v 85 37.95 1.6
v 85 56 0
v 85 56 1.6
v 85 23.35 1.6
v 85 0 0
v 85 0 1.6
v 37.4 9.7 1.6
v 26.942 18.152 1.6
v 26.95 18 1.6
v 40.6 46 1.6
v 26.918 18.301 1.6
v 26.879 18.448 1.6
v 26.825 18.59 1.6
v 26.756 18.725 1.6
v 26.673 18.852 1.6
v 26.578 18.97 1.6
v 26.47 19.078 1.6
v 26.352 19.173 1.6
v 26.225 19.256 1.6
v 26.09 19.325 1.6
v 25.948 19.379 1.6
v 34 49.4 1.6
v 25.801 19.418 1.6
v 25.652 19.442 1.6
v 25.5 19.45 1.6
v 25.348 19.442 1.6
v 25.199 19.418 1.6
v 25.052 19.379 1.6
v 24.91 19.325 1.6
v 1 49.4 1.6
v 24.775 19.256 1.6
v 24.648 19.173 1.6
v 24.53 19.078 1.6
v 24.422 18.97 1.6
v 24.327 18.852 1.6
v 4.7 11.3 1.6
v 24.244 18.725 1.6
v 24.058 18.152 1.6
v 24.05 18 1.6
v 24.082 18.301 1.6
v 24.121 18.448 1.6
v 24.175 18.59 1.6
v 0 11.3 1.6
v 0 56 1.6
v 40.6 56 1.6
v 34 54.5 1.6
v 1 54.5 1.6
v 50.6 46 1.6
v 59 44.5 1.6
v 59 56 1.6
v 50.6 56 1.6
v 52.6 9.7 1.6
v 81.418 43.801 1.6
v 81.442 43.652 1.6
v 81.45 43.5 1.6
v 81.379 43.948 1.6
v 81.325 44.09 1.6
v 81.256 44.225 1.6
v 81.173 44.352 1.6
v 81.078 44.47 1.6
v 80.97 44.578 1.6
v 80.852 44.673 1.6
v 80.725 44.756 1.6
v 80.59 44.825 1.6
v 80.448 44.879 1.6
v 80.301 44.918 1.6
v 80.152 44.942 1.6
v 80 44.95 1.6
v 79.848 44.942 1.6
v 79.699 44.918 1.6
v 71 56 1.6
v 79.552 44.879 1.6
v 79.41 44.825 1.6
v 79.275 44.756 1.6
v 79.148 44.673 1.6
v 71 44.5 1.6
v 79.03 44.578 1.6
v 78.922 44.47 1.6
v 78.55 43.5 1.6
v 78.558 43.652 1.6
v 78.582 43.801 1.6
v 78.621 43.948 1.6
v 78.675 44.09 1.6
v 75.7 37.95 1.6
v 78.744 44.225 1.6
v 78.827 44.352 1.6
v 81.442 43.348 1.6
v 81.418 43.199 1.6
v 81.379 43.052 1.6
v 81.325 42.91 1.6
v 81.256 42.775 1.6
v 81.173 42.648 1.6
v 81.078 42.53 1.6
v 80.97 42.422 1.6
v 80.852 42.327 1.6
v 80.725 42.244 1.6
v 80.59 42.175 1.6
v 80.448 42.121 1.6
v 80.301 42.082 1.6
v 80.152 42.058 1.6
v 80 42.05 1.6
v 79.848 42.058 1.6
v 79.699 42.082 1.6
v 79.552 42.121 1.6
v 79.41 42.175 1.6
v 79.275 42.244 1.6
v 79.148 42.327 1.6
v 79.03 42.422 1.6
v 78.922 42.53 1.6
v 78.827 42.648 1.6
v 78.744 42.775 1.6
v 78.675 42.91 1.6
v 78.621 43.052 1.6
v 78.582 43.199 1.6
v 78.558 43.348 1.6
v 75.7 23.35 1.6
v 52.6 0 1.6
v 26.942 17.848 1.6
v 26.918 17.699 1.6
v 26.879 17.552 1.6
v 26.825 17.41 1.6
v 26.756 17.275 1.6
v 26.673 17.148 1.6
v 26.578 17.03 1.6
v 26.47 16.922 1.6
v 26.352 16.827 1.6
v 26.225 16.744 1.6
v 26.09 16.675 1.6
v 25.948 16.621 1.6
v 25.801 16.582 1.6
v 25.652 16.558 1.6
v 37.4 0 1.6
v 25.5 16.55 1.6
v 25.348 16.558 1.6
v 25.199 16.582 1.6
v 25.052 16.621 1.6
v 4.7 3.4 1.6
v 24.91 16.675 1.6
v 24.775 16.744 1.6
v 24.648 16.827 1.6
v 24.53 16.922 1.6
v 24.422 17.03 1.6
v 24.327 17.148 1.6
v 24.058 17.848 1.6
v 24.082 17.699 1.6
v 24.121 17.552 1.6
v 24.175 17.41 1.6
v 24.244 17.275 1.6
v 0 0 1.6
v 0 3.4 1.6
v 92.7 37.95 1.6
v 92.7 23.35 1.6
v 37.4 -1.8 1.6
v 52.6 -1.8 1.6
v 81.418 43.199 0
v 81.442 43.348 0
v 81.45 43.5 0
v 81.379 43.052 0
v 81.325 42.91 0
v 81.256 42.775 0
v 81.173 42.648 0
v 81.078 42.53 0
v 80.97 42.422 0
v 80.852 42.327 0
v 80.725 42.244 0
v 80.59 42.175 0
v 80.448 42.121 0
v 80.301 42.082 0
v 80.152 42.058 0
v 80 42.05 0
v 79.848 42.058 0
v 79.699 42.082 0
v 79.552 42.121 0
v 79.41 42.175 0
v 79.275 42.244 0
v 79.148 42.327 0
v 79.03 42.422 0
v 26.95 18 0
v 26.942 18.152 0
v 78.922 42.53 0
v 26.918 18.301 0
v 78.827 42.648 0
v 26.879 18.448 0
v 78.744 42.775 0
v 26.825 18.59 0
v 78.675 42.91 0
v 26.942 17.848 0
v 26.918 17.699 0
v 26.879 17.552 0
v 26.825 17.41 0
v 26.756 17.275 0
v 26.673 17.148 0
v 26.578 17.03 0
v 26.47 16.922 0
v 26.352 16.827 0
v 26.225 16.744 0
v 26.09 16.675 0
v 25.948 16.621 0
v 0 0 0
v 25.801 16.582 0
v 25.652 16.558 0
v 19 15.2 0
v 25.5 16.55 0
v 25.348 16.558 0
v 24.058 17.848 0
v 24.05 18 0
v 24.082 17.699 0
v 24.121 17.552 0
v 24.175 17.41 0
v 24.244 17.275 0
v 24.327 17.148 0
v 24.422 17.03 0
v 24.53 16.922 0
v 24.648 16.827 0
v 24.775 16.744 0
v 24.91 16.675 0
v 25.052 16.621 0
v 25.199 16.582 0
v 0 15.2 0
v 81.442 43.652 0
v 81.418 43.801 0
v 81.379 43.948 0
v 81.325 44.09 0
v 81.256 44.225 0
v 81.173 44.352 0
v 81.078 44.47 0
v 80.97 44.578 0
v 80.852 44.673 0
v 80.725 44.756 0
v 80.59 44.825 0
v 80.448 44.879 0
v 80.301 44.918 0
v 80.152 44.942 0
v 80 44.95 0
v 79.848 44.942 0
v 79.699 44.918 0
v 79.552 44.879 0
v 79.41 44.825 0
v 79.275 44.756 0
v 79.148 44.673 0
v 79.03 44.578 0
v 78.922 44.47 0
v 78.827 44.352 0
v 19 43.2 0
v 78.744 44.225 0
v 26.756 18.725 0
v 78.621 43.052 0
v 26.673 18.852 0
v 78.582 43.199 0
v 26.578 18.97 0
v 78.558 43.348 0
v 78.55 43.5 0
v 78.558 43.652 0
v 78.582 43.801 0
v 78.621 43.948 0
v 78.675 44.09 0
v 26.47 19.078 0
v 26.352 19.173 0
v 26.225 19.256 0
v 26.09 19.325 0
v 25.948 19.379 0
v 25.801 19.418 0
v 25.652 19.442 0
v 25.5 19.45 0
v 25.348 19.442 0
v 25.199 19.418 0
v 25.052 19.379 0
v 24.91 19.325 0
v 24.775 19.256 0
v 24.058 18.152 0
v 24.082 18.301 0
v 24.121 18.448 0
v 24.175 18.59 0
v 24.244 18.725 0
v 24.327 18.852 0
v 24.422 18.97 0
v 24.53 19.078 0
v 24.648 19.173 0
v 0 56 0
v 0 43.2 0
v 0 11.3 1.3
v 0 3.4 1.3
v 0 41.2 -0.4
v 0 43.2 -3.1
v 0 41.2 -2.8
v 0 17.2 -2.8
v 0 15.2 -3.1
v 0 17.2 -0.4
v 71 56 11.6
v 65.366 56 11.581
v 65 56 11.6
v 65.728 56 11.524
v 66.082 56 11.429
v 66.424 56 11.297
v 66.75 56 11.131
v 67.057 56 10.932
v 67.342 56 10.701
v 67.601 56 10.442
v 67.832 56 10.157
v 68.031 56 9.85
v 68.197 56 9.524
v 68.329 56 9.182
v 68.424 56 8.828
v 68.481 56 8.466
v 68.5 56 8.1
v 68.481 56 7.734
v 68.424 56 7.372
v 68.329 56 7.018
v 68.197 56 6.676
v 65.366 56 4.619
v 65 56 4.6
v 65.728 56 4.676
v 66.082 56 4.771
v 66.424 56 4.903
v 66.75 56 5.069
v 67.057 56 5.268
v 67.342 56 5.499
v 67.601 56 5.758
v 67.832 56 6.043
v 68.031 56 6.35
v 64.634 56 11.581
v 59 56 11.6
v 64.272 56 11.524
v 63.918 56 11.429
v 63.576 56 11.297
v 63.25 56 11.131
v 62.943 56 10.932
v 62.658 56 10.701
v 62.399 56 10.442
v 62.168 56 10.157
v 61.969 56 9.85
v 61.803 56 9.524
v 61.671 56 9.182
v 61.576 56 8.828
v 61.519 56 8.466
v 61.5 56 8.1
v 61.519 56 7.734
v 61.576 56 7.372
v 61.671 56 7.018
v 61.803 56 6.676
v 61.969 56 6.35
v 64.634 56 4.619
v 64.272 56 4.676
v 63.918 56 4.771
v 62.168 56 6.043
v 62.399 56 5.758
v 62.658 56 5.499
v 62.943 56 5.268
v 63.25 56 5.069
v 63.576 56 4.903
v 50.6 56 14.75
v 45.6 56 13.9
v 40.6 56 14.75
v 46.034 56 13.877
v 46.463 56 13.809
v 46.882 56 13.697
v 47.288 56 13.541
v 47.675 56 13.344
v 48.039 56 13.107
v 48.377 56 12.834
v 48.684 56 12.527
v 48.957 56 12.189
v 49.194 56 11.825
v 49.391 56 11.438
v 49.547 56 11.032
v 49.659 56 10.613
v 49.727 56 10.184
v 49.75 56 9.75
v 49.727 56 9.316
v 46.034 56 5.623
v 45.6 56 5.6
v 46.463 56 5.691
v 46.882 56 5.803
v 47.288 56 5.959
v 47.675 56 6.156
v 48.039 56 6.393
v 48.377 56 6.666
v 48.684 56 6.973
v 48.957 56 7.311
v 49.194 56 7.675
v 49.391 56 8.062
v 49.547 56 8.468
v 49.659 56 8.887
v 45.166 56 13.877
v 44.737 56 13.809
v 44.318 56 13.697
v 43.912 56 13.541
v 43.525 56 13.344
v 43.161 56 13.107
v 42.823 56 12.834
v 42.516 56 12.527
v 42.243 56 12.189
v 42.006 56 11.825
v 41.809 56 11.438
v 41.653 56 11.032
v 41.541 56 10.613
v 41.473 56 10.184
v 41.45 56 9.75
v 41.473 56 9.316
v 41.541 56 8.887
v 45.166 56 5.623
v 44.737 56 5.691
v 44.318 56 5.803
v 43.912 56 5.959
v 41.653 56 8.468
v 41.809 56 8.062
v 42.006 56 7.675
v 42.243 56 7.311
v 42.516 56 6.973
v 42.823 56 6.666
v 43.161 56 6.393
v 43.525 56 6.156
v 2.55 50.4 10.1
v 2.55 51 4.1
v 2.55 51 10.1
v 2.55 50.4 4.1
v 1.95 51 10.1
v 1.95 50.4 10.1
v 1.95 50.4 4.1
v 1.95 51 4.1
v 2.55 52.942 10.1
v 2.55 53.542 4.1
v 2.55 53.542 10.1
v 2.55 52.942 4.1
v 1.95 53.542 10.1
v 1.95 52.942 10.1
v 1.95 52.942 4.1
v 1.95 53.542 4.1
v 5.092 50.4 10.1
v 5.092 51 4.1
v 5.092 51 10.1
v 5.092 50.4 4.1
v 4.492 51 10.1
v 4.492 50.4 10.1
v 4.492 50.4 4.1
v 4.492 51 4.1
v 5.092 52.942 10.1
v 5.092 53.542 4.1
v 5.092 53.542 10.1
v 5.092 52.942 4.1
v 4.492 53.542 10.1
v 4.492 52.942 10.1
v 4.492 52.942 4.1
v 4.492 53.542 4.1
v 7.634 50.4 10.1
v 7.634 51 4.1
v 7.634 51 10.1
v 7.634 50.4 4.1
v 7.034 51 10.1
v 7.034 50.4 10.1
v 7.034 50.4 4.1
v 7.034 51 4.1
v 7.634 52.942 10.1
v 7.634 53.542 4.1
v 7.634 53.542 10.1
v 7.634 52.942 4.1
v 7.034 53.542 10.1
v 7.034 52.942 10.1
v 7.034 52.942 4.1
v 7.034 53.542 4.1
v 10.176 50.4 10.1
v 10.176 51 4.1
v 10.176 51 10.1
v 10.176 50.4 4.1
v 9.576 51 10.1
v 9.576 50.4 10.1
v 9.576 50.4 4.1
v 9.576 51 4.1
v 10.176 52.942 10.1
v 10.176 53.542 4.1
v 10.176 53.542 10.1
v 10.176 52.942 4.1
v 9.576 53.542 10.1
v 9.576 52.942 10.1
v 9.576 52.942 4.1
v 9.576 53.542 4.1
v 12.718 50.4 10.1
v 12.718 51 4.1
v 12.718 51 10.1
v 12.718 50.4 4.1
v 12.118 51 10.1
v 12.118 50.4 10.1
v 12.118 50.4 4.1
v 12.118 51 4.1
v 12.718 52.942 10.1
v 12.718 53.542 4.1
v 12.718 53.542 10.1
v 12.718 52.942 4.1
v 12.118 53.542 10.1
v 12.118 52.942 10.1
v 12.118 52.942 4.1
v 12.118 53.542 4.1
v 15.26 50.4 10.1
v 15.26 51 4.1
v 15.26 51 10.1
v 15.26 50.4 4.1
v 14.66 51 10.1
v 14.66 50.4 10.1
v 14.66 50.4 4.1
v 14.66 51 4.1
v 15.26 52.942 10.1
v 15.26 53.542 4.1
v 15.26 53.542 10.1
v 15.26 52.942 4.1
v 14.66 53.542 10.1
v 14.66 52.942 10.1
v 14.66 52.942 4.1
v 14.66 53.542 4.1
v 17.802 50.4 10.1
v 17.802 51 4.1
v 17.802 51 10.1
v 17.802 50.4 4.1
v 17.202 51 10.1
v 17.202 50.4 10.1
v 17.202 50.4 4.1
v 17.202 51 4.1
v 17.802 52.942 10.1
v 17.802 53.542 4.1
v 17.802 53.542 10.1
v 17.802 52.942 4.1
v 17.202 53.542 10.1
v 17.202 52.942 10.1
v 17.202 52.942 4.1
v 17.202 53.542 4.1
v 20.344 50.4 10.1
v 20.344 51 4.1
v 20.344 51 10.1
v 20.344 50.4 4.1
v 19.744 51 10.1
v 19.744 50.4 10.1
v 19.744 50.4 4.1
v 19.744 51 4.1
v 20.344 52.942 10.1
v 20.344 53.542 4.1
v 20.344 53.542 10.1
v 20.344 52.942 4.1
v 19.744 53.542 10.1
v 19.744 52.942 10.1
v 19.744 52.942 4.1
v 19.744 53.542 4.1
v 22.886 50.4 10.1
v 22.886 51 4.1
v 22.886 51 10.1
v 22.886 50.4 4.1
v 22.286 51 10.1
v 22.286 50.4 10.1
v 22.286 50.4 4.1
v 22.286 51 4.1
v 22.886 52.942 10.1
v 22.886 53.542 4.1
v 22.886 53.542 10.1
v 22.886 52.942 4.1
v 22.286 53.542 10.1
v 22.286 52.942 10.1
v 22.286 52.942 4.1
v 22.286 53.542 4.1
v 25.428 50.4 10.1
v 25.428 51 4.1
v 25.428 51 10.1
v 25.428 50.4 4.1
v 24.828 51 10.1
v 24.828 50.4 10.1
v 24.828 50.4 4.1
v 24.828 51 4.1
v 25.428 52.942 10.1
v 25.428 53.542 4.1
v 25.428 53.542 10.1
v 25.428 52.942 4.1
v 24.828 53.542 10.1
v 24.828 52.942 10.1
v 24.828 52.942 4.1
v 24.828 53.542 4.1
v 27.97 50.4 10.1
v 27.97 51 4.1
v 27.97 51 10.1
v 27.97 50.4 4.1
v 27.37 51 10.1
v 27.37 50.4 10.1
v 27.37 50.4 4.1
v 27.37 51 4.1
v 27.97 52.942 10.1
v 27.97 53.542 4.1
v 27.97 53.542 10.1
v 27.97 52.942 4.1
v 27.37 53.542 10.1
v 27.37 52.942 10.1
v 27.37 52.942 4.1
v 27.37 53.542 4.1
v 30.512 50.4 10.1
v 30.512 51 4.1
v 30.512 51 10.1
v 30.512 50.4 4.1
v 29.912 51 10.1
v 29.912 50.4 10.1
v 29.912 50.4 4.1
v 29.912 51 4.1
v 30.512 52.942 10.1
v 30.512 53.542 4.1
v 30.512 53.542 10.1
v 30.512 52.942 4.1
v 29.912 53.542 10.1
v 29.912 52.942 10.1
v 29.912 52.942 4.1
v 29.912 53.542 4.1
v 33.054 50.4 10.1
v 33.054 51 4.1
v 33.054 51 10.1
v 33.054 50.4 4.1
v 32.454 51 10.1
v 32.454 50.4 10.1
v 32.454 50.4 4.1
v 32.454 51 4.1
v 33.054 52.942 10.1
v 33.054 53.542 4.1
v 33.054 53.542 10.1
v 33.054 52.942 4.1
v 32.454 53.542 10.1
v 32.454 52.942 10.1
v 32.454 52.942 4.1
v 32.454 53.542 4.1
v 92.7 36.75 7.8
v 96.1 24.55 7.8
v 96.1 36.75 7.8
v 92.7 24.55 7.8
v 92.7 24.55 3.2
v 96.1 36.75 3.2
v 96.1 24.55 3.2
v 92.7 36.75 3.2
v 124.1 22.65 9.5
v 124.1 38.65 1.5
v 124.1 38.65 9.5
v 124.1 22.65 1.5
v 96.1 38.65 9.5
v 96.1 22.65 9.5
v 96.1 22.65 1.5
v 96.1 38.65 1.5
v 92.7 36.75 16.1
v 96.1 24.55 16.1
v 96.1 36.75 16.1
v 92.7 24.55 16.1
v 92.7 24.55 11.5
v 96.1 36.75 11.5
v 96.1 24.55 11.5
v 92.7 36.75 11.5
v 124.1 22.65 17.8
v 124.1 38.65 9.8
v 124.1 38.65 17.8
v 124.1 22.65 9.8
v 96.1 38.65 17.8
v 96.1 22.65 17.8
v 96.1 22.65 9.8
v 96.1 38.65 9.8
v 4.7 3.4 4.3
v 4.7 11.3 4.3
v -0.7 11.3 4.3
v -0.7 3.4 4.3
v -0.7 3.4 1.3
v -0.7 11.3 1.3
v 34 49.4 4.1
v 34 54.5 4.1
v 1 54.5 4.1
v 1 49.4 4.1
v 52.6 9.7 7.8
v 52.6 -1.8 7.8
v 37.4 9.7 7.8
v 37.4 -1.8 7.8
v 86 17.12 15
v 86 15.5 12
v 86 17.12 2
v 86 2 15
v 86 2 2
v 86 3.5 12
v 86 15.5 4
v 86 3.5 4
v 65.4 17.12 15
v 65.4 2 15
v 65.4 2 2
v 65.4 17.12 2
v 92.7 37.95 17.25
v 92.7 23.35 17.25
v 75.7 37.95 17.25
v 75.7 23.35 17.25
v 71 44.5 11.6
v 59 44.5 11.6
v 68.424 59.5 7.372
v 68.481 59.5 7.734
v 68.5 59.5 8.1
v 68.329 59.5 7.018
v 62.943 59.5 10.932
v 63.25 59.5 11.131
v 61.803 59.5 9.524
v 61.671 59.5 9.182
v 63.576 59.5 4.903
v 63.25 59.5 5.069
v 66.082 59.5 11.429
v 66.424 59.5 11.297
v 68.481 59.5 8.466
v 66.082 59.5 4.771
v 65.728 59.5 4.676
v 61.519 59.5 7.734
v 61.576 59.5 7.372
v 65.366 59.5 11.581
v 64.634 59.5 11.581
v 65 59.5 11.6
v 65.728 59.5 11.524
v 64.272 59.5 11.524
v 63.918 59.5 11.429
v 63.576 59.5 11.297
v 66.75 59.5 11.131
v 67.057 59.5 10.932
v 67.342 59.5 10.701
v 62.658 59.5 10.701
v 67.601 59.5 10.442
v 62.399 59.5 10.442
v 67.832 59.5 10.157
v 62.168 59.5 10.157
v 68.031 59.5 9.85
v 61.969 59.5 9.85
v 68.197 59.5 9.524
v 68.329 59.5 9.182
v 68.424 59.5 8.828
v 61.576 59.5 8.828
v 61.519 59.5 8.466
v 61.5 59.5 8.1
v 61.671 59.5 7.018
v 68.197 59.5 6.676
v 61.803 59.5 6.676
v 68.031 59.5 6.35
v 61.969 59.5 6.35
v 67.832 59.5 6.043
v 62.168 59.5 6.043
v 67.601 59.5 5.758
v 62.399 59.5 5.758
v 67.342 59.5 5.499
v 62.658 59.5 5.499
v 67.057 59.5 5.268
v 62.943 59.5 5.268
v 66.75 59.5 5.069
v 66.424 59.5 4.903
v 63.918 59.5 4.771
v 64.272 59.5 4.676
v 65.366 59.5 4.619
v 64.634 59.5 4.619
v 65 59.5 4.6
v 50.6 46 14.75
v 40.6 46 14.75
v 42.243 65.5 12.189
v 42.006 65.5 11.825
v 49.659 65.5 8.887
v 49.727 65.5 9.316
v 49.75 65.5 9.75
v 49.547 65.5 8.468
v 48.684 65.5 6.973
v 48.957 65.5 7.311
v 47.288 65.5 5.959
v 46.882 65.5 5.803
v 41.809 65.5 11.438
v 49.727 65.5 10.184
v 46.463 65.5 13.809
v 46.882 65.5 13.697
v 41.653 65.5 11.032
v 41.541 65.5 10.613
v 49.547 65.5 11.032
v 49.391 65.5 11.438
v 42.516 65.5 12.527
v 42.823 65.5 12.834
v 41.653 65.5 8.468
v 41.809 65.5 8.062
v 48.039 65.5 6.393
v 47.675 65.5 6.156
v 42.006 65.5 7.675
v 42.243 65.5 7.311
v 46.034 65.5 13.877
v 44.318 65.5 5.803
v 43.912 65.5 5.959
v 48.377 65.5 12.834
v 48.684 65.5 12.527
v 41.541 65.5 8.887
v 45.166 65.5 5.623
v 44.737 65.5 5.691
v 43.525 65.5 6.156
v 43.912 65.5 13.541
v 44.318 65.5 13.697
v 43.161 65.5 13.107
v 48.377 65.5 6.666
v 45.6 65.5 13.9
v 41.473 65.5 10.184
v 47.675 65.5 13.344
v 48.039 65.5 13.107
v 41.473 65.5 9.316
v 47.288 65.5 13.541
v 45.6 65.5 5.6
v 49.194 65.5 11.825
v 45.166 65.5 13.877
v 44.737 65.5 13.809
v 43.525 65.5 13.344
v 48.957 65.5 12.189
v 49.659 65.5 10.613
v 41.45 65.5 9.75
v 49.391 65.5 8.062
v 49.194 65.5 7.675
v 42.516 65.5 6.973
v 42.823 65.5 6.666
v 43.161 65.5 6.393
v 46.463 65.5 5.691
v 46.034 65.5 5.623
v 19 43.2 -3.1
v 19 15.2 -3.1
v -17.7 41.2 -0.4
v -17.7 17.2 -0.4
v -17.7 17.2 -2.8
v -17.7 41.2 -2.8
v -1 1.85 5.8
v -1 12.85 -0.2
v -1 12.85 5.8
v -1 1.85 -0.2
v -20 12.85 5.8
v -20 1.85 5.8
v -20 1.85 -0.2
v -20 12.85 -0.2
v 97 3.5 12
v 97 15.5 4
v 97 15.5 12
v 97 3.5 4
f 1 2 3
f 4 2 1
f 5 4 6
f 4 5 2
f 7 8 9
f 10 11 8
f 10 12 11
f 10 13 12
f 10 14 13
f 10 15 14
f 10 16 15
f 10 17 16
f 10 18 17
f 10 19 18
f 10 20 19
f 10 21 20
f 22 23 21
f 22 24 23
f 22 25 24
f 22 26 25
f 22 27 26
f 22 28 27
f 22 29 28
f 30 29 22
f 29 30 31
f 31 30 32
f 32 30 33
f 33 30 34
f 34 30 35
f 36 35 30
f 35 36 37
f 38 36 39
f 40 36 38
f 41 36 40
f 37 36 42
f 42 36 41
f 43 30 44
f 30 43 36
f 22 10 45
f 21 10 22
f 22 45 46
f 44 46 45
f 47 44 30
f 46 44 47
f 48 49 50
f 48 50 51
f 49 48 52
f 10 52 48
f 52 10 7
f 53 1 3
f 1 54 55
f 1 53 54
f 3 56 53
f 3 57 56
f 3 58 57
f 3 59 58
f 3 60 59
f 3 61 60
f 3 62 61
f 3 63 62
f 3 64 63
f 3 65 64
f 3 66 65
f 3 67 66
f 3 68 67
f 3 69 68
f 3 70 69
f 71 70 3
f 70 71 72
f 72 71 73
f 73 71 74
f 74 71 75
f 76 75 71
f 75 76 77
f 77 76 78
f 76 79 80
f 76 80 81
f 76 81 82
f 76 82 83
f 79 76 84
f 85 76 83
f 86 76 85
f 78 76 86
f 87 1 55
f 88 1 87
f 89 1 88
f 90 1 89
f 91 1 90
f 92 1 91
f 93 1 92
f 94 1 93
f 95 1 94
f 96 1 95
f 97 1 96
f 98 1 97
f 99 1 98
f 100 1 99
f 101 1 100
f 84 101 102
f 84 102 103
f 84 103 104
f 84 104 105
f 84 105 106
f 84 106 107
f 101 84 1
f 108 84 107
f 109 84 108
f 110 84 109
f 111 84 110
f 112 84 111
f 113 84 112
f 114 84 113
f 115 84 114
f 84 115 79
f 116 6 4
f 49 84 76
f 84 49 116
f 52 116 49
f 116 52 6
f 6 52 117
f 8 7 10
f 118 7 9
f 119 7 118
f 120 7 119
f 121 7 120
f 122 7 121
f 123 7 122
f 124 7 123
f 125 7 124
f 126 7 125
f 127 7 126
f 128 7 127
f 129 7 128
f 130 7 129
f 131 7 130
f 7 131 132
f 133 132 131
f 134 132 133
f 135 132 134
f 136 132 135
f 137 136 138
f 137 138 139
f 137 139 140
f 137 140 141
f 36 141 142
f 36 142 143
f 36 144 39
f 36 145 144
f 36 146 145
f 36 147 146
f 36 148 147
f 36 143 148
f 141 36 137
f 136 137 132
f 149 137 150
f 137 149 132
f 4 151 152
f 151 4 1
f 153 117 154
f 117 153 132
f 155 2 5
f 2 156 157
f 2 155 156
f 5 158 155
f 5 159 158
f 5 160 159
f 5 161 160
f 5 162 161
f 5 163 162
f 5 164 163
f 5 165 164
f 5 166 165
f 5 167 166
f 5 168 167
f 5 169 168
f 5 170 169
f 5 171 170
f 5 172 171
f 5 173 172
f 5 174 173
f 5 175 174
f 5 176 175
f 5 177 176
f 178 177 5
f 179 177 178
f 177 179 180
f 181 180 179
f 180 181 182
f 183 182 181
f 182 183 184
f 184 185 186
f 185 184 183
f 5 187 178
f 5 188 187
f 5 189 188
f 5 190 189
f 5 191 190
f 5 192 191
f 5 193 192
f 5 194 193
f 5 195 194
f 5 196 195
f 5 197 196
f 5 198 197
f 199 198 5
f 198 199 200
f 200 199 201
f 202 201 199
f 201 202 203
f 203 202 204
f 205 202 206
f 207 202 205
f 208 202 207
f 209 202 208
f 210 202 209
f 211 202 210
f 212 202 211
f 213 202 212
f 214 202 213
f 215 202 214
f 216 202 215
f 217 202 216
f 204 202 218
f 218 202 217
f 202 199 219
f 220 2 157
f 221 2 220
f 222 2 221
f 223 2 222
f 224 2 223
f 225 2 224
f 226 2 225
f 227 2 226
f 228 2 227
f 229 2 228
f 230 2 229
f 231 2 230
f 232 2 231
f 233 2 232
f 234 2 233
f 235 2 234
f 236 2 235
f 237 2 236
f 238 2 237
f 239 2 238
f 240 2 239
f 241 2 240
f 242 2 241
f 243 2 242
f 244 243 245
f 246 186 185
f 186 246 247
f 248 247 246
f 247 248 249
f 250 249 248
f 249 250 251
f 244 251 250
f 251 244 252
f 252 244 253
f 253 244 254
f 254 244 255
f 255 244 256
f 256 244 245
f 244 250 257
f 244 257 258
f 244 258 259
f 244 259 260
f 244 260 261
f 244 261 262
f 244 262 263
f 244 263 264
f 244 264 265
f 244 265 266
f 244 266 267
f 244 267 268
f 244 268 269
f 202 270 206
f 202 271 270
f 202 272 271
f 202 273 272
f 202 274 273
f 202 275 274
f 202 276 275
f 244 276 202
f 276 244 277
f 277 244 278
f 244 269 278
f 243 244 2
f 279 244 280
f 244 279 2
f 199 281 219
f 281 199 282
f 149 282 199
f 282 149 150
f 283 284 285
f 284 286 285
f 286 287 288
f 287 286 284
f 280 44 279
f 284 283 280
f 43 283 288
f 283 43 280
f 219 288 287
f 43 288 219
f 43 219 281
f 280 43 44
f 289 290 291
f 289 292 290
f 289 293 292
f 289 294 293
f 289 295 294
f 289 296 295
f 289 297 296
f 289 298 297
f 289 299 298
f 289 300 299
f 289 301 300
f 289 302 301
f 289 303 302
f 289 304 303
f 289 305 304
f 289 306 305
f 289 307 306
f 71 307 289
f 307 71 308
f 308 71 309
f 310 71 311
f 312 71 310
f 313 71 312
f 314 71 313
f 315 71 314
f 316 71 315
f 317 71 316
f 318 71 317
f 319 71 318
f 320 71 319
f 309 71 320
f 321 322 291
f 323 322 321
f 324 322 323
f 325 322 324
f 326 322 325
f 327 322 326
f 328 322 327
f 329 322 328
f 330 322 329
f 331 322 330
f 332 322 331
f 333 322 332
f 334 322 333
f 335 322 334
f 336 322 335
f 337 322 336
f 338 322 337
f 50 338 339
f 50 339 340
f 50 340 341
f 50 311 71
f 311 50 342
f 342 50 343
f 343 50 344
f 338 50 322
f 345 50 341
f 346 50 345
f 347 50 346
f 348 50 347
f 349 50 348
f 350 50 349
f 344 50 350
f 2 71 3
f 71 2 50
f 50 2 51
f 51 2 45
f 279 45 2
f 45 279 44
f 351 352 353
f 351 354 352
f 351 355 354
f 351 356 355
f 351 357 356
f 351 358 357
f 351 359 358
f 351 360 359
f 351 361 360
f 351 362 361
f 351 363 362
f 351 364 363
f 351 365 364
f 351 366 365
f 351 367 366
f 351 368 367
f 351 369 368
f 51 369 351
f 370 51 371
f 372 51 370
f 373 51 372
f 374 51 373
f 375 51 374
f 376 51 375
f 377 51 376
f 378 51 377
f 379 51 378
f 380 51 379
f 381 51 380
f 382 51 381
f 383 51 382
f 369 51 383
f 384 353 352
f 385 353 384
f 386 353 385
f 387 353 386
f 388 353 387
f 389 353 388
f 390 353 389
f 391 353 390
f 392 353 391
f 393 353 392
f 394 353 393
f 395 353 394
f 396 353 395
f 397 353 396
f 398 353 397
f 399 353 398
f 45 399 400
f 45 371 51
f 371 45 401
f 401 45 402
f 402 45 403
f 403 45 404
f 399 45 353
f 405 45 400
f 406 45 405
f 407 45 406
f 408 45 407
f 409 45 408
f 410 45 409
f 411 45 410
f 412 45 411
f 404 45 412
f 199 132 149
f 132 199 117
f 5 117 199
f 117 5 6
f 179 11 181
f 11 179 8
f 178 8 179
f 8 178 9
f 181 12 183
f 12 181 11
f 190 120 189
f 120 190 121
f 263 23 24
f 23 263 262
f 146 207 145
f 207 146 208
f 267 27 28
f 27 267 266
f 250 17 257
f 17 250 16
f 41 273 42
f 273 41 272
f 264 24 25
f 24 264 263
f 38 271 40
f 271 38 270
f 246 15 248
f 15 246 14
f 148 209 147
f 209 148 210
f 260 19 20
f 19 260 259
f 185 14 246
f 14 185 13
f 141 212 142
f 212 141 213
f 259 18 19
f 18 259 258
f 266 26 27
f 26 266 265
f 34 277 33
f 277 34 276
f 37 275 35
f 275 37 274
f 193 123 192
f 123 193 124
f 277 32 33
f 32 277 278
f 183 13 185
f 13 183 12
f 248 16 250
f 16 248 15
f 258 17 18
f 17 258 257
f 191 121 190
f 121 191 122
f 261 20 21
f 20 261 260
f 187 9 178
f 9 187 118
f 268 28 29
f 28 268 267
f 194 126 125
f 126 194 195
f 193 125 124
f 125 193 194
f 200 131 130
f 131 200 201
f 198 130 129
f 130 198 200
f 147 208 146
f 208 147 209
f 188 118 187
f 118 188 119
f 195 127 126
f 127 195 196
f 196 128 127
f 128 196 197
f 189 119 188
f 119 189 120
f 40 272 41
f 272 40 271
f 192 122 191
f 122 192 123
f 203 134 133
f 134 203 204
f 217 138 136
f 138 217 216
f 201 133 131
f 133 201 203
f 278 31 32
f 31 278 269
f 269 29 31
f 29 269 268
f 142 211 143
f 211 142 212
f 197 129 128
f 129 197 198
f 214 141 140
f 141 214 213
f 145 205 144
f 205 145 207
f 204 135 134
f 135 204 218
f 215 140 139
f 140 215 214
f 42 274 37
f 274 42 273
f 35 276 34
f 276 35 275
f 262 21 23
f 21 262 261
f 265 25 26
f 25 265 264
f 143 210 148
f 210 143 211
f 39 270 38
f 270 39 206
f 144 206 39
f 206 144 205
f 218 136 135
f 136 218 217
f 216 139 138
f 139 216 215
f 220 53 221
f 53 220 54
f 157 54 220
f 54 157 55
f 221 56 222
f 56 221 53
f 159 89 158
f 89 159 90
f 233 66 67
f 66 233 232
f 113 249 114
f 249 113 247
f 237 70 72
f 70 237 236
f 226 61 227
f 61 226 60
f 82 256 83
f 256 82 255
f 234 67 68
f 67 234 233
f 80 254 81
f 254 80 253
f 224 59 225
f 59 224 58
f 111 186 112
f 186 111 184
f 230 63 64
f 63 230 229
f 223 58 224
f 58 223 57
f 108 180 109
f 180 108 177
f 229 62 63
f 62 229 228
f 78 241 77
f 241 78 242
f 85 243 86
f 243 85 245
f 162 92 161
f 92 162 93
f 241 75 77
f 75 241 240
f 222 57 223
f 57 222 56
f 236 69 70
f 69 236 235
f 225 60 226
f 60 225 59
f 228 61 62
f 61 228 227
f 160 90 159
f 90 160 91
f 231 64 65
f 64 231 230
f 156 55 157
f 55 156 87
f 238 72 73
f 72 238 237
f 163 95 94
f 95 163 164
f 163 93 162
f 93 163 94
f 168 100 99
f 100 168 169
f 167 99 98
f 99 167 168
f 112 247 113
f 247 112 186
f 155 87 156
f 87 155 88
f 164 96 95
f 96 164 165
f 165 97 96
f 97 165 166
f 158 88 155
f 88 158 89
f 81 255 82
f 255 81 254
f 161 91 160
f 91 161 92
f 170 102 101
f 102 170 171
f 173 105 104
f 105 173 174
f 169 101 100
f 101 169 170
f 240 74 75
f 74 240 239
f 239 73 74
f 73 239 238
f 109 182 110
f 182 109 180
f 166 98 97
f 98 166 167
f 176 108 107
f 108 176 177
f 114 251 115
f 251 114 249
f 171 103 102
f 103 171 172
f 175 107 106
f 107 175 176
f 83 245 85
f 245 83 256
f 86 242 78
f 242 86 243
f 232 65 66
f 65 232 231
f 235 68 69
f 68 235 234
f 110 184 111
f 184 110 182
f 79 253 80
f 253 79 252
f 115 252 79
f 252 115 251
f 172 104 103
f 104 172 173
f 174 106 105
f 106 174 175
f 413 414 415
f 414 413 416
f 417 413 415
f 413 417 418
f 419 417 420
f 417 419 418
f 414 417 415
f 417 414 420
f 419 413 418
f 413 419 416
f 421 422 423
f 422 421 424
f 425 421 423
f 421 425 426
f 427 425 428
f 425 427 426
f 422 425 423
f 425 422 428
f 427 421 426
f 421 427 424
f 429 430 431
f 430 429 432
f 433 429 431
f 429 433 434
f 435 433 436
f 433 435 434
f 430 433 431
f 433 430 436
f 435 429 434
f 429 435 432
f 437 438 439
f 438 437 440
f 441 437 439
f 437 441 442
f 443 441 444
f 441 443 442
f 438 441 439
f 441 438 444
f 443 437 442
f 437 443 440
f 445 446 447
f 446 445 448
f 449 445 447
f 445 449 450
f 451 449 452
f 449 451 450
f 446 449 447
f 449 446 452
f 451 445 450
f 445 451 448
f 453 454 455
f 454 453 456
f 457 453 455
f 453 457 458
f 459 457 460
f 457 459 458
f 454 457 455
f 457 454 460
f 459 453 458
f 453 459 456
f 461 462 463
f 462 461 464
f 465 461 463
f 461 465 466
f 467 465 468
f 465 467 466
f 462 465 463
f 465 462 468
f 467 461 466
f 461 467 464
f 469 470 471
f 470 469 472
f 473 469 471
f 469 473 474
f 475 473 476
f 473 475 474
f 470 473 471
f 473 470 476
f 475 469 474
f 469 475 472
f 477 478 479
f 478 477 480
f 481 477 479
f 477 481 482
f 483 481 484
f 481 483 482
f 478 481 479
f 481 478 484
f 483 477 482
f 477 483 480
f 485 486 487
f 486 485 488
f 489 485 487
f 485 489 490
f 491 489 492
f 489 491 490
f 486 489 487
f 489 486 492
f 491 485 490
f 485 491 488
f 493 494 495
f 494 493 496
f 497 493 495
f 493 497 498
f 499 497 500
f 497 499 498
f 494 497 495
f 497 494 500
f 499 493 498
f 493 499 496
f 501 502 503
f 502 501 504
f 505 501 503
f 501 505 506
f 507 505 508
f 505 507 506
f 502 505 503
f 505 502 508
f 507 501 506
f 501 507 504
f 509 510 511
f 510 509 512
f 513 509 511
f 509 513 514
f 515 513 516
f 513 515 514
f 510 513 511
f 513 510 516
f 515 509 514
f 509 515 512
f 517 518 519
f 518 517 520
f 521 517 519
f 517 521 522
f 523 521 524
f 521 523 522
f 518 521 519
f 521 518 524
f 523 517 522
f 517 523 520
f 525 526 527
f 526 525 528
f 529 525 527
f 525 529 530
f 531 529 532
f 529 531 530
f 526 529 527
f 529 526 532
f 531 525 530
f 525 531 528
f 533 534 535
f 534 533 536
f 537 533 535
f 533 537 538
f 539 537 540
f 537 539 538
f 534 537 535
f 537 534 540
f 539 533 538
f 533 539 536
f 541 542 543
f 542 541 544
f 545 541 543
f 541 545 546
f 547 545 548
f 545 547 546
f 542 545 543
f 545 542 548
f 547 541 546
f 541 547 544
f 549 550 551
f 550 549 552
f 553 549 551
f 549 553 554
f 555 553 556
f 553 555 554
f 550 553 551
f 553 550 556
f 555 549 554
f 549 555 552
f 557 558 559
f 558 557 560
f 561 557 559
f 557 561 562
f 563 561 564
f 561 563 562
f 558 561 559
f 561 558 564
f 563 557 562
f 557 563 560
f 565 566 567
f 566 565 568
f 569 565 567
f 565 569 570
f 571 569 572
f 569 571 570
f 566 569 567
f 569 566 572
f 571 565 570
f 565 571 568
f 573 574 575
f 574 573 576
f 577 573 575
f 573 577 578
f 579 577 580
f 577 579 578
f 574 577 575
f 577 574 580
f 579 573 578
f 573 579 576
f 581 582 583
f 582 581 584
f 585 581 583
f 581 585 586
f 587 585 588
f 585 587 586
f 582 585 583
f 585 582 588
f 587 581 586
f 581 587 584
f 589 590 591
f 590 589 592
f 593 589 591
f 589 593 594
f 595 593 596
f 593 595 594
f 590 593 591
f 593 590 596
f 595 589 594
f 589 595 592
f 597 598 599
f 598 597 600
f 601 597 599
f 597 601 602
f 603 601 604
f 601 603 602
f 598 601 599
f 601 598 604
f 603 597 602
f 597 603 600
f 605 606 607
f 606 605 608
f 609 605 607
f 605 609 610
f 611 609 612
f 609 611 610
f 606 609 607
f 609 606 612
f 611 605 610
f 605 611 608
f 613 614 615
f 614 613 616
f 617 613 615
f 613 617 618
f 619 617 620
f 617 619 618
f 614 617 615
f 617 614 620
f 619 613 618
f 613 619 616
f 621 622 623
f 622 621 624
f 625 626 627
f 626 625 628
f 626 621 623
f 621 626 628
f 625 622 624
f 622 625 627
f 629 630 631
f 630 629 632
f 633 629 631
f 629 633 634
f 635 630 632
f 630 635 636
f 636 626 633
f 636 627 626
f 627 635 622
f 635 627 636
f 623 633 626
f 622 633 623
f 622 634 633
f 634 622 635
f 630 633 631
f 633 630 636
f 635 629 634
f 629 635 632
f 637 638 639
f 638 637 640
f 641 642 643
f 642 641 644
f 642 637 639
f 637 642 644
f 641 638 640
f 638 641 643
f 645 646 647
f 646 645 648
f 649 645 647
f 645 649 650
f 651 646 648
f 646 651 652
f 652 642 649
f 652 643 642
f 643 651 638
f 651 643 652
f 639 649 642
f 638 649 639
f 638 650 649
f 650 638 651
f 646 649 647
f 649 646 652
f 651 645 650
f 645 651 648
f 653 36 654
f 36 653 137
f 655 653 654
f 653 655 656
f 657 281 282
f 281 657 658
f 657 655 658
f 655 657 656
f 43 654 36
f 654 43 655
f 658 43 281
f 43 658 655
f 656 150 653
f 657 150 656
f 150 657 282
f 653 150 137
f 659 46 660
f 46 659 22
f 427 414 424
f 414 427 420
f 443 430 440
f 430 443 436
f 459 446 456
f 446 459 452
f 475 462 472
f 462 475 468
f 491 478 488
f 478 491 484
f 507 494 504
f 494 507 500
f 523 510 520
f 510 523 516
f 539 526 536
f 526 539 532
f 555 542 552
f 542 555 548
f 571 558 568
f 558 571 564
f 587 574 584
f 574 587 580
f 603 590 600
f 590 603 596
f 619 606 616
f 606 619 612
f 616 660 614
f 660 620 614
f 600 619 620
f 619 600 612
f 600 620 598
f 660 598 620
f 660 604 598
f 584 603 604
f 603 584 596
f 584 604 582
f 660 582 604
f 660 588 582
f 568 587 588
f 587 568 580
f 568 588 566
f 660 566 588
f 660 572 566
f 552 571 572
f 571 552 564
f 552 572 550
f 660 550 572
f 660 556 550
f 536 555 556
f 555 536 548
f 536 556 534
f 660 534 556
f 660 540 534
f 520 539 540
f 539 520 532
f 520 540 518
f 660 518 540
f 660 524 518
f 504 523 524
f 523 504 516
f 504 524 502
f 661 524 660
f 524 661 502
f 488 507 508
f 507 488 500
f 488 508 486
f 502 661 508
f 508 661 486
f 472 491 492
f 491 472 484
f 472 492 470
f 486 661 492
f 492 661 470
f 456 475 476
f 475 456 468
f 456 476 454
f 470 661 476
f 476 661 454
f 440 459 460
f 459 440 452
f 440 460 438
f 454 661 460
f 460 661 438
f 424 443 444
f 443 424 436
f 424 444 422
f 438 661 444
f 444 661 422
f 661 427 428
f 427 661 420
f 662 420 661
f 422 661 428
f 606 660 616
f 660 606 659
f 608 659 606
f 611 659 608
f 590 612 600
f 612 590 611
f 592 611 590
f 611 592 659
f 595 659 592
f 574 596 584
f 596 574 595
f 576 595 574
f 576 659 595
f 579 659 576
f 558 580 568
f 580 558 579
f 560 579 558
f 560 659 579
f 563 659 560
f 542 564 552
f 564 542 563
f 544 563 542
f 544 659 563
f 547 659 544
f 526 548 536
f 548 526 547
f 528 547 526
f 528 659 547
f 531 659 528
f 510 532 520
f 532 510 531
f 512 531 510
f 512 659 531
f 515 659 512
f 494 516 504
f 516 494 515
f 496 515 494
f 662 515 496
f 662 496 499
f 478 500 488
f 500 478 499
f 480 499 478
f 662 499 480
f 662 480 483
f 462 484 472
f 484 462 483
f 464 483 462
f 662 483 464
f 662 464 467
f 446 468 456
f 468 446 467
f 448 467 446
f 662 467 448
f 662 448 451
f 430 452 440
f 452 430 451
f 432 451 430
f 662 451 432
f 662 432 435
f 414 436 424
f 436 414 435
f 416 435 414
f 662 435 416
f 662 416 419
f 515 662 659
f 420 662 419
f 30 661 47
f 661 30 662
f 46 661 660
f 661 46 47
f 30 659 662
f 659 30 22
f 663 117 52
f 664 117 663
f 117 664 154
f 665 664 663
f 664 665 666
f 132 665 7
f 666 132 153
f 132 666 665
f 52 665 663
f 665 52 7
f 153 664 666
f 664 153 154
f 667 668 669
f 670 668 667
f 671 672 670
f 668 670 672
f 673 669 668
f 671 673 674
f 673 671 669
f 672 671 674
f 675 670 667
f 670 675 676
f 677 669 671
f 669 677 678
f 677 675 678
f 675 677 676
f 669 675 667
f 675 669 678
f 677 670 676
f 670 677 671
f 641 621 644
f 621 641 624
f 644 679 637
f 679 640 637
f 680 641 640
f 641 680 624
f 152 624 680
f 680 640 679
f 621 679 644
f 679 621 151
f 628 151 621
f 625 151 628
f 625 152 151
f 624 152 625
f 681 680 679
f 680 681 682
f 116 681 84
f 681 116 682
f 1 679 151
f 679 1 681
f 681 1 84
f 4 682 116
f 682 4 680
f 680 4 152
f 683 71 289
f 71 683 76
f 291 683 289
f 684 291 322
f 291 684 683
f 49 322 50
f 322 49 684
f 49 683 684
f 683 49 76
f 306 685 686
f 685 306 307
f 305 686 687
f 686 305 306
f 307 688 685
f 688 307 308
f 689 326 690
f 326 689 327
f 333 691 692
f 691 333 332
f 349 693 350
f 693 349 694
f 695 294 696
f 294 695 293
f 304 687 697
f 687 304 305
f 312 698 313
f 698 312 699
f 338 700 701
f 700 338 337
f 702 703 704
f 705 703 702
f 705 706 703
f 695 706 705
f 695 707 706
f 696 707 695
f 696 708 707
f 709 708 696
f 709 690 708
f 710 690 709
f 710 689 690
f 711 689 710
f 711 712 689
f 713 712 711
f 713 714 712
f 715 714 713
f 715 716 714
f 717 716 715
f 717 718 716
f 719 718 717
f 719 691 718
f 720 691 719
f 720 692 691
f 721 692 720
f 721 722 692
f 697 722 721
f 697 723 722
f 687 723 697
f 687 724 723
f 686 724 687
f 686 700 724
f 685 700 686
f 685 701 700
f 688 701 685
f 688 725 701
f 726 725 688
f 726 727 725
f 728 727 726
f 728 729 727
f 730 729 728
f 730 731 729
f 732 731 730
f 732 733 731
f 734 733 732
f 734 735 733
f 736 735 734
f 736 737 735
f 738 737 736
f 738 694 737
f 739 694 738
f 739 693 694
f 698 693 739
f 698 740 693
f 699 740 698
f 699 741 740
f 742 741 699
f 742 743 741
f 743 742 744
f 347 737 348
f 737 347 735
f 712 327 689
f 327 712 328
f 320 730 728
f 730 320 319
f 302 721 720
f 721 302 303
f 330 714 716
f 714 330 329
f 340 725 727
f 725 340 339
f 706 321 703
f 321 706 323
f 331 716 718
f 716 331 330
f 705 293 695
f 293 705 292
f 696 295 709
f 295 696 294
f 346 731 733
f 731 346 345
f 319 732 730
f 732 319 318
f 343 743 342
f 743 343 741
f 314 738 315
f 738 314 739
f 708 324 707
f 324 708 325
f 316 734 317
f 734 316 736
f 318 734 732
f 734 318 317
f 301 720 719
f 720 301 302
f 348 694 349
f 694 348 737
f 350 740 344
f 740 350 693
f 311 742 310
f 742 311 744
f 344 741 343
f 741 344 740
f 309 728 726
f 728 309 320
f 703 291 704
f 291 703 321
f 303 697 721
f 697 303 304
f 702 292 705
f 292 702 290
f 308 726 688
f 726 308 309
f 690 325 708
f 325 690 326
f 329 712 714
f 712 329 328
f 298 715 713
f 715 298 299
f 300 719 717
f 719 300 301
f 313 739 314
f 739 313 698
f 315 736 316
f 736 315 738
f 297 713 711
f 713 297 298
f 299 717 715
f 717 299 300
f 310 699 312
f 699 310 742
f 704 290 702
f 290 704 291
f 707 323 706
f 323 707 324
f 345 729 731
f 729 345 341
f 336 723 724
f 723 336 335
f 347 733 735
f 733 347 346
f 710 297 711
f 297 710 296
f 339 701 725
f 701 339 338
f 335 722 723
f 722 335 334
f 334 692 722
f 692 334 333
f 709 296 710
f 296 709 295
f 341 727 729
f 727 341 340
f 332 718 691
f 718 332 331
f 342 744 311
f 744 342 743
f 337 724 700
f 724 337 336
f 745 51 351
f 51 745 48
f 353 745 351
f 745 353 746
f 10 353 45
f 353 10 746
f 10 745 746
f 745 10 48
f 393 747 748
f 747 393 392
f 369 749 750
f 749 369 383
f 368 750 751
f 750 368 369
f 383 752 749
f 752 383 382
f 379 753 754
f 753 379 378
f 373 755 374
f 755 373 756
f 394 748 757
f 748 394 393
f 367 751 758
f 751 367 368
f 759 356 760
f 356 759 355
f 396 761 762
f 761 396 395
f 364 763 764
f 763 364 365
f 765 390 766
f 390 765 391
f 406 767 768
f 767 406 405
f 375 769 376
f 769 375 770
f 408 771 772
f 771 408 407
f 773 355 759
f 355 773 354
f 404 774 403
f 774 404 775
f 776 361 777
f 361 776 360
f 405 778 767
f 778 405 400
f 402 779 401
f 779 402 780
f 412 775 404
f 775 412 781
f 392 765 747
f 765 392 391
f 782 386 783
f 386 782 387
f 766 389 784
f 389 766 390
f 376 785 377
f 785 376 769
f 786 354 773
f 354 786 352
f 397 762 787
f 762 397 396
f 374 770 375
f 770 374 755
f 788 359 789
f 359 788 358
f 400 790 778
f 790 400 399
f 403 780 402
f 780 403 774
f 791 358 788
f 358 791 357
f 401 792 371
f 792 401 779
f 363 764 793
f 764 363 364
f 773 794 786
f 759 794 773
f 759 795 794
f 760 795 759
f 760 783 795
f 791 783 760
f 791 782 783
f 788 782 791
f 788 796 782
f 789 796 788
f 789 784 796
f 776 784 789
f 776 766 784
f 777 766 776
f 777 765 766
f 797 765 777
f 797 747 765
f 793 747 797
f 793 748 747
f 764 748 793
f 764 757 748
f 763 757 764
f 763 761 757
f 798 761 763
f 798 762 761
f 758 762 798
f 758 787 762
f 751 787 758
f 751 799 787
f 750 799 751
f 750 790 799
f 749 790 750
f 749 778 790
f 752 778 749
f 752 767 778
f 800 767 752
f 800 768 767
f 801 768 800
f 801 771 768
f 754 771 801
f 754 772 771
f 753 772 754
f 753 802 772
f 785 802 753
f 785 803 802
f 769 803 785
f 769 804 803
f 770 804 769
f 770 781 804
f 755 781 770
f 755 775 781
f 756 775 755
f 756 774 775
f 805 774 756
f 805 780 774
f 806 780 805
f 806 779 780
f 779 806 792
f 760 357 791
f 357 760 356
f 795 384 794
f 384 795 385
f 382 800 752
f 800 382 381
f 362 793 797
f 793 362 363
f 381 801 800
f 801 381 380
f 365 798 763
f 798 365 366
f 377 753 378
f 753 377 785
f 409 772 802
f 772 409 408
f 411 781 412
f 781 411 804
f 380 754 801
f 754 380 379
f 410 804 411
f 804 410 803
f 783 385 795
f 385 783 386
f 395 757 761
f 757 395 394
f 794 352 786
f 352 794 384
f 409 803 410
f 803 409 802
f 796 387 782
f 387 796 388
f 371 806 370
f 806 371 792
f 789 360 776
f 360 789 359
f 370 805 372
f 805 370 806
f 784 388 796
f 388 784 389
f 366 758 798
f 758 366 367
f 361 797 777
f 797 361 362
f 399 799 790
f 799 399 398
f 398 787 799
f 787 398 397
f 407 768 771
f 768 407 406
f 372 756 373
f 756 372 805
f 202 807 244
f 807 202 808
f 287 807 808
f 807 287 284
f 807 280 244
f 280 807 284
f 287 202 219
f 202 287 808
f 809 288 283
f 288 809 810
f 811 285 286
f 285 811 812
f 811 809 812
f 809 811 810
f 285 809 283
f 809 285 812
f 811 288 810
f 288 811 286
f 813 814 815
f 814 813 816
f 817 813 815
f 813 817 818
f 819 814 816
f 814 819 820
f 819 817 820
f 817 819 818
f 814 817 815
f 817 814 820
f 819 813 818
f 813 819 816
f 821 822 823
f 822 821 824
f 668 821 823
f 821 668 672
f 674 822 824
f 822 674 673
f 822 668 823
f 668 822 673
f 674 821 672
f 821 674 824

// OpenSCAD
/*
 * Raspberry Pi Model B Revision 2.0
 *
 * Copyright 2012 b@Zi.iS
 *
 * License CC BY 3.0
 */
$fn=60;

pi();

module pi(
	port_allowance=0,
	sdcard = 32, // Lengths if present
	power = 25,
	ethernet = 22,
	usb = [40, 40],
) {

	// PCB
	color([0,.75,0]) {
		difference() {
			cube([
				85,
				56,
				1.6
			]);
			// Mounting holes
			translate([
				25.5,
				18,
				-1
			]) {
				cylinder(
					r = 2.9/2,
					h = 4
				);
			}
			translate([
				85 - 5,
				56 - 12.5,
				-1
			]) {
				cylinder(
					r = 2.9/2,
					h = 4
				);
			}
		}
	}

	// Power
	color([.85,.85,.85]) {
		translate([
			-.7 - port_allowance,
			3.4 - port_allowance,
			1.3 - port_allowance
		]) {
			cube([
				5.4 + port_allowance*2,
				7.9 + port_allowance*2,
				3 + port_allowance*2
			]);
		}
	}

	// Header
	color([0,0,0]) {
		translate([
			1,
			49.4,
			1.6
		]) {
			cube([
				33,
				5.1,
				2.5
			]);
		}
	}
	//Pins
	color([1,1,0]) {
		for (x=[0:12]) {
			for (y=[0:1]) {
				translate([
					1.95 + x*2.542,
					50.4 + y*2.542,
					1.6
				]) {
					cube([
						.6,
						.6,
						8.5
					]);
				}
			}
		}
	}

	// HDMI
	color([.85,.85,.85]) {
		translate([
			37.4 - port_allowance,
			-1.8 - port_allowance,
			1.6 - port_allowance
		]) {
			cube([
				15.2 + port_allowance*2,
				11.5 + port_allowance*2,
				6.2 + port_allowance*2
			]);
		}
	}

	// Ethernet
	color([.85,.85,.85]) {
		translate([
			65.4 - port_allowance,
			2 - port_allowance,
			2 - port_allowance
		]) {
			cube([
				20.6 + port_allowance*2,
				15.12 + port_allowance*2,
				13 + port_allowance*2
			]);
		}
	}

	// USB
	color([.85,.85,.85]) {
		translate([
			75.7 - port_allowance,
			23.35- port_allowance,
			1.6 - port_allowance
		]) {
			cube([
				17 + port_allowance*2,
				14.6 + port_allowance*2,
				15.65 + port_allowance*2
			]);
		}
	}

	// Audio
	color([0,0,0]) {
		translate([
			59,
			44.5,
			1.6
		]) {
			cube([
				12,
				11.5,
				10
			]);
		}
	}
	color([0,0,0]) {
		translate([
			65,
			56,
			8.1
		]) {
			rotate([
				-90,
				0,
				0
			]) {
				cylinder(
					r=3.5 + port_allowance,
					h = 3.5 + port_allowance
				);
			}
		}
	}

	// Video
	color([1,1,0]) {
		translate([
			40.6,
			46,
			1.6
		]) {
			cube([
				10,
				10,
				13.15
			]);
		}
	}
	color([.95,.95,.95]) {
		translate([
			45.6,
			56,
			9.75
		]) {
			rotate([
				-90,
				0,
				0
			]) {
				cylinder(
					r=4.15 + port_allowance,
					h = 9.5 + port_allowance
				);
			}
		}
	}

	// SD-Card Slot
	color([0,0,0]) {
		translate([
			0,
			15.2,
			-3.1
		]) {
			cube([
				19,
				28,
				3.1
			]);
		}
	}

	// SD-Card
	color([0,0,1]) {
		translate([
			14.3 - sdcard,
			17.2,
			-2.8
		]) {
			cube([
				sdcard,
				24,
				2.4
			]);
		}
	}

	// Power
	color([0,0,0]) {
		translate([
			5 - power,
			1.85,
			-.2
		]) {
			cube([
				power - 6,
				11,
				6
			]);
		}
	}

	// Ethernet
	color([1,1,0]) {
		translate([
			75,
			3.5,
			4
		]) {
			cube([
				ethernet,
				12,
				8
			]);
		}
	}

	for (i=[0:1]) {
		if(usb[i]>0) {
			color([.95,.95,.95]) {
				translate([
					84.1,
					24.55,
					3.2 + 8.3*i
				]) {
					cube([
						13,
						12.2,
						4.6
					]);
				}
			}
		}
		color([0,0,0]) {
			translate([
				96.1,
				22.65,
				1.5 + 8.3*i
			]) {
				cube([
					usb[i] - 12,
					16,
					8
				]);
			}
		}
	}
}
